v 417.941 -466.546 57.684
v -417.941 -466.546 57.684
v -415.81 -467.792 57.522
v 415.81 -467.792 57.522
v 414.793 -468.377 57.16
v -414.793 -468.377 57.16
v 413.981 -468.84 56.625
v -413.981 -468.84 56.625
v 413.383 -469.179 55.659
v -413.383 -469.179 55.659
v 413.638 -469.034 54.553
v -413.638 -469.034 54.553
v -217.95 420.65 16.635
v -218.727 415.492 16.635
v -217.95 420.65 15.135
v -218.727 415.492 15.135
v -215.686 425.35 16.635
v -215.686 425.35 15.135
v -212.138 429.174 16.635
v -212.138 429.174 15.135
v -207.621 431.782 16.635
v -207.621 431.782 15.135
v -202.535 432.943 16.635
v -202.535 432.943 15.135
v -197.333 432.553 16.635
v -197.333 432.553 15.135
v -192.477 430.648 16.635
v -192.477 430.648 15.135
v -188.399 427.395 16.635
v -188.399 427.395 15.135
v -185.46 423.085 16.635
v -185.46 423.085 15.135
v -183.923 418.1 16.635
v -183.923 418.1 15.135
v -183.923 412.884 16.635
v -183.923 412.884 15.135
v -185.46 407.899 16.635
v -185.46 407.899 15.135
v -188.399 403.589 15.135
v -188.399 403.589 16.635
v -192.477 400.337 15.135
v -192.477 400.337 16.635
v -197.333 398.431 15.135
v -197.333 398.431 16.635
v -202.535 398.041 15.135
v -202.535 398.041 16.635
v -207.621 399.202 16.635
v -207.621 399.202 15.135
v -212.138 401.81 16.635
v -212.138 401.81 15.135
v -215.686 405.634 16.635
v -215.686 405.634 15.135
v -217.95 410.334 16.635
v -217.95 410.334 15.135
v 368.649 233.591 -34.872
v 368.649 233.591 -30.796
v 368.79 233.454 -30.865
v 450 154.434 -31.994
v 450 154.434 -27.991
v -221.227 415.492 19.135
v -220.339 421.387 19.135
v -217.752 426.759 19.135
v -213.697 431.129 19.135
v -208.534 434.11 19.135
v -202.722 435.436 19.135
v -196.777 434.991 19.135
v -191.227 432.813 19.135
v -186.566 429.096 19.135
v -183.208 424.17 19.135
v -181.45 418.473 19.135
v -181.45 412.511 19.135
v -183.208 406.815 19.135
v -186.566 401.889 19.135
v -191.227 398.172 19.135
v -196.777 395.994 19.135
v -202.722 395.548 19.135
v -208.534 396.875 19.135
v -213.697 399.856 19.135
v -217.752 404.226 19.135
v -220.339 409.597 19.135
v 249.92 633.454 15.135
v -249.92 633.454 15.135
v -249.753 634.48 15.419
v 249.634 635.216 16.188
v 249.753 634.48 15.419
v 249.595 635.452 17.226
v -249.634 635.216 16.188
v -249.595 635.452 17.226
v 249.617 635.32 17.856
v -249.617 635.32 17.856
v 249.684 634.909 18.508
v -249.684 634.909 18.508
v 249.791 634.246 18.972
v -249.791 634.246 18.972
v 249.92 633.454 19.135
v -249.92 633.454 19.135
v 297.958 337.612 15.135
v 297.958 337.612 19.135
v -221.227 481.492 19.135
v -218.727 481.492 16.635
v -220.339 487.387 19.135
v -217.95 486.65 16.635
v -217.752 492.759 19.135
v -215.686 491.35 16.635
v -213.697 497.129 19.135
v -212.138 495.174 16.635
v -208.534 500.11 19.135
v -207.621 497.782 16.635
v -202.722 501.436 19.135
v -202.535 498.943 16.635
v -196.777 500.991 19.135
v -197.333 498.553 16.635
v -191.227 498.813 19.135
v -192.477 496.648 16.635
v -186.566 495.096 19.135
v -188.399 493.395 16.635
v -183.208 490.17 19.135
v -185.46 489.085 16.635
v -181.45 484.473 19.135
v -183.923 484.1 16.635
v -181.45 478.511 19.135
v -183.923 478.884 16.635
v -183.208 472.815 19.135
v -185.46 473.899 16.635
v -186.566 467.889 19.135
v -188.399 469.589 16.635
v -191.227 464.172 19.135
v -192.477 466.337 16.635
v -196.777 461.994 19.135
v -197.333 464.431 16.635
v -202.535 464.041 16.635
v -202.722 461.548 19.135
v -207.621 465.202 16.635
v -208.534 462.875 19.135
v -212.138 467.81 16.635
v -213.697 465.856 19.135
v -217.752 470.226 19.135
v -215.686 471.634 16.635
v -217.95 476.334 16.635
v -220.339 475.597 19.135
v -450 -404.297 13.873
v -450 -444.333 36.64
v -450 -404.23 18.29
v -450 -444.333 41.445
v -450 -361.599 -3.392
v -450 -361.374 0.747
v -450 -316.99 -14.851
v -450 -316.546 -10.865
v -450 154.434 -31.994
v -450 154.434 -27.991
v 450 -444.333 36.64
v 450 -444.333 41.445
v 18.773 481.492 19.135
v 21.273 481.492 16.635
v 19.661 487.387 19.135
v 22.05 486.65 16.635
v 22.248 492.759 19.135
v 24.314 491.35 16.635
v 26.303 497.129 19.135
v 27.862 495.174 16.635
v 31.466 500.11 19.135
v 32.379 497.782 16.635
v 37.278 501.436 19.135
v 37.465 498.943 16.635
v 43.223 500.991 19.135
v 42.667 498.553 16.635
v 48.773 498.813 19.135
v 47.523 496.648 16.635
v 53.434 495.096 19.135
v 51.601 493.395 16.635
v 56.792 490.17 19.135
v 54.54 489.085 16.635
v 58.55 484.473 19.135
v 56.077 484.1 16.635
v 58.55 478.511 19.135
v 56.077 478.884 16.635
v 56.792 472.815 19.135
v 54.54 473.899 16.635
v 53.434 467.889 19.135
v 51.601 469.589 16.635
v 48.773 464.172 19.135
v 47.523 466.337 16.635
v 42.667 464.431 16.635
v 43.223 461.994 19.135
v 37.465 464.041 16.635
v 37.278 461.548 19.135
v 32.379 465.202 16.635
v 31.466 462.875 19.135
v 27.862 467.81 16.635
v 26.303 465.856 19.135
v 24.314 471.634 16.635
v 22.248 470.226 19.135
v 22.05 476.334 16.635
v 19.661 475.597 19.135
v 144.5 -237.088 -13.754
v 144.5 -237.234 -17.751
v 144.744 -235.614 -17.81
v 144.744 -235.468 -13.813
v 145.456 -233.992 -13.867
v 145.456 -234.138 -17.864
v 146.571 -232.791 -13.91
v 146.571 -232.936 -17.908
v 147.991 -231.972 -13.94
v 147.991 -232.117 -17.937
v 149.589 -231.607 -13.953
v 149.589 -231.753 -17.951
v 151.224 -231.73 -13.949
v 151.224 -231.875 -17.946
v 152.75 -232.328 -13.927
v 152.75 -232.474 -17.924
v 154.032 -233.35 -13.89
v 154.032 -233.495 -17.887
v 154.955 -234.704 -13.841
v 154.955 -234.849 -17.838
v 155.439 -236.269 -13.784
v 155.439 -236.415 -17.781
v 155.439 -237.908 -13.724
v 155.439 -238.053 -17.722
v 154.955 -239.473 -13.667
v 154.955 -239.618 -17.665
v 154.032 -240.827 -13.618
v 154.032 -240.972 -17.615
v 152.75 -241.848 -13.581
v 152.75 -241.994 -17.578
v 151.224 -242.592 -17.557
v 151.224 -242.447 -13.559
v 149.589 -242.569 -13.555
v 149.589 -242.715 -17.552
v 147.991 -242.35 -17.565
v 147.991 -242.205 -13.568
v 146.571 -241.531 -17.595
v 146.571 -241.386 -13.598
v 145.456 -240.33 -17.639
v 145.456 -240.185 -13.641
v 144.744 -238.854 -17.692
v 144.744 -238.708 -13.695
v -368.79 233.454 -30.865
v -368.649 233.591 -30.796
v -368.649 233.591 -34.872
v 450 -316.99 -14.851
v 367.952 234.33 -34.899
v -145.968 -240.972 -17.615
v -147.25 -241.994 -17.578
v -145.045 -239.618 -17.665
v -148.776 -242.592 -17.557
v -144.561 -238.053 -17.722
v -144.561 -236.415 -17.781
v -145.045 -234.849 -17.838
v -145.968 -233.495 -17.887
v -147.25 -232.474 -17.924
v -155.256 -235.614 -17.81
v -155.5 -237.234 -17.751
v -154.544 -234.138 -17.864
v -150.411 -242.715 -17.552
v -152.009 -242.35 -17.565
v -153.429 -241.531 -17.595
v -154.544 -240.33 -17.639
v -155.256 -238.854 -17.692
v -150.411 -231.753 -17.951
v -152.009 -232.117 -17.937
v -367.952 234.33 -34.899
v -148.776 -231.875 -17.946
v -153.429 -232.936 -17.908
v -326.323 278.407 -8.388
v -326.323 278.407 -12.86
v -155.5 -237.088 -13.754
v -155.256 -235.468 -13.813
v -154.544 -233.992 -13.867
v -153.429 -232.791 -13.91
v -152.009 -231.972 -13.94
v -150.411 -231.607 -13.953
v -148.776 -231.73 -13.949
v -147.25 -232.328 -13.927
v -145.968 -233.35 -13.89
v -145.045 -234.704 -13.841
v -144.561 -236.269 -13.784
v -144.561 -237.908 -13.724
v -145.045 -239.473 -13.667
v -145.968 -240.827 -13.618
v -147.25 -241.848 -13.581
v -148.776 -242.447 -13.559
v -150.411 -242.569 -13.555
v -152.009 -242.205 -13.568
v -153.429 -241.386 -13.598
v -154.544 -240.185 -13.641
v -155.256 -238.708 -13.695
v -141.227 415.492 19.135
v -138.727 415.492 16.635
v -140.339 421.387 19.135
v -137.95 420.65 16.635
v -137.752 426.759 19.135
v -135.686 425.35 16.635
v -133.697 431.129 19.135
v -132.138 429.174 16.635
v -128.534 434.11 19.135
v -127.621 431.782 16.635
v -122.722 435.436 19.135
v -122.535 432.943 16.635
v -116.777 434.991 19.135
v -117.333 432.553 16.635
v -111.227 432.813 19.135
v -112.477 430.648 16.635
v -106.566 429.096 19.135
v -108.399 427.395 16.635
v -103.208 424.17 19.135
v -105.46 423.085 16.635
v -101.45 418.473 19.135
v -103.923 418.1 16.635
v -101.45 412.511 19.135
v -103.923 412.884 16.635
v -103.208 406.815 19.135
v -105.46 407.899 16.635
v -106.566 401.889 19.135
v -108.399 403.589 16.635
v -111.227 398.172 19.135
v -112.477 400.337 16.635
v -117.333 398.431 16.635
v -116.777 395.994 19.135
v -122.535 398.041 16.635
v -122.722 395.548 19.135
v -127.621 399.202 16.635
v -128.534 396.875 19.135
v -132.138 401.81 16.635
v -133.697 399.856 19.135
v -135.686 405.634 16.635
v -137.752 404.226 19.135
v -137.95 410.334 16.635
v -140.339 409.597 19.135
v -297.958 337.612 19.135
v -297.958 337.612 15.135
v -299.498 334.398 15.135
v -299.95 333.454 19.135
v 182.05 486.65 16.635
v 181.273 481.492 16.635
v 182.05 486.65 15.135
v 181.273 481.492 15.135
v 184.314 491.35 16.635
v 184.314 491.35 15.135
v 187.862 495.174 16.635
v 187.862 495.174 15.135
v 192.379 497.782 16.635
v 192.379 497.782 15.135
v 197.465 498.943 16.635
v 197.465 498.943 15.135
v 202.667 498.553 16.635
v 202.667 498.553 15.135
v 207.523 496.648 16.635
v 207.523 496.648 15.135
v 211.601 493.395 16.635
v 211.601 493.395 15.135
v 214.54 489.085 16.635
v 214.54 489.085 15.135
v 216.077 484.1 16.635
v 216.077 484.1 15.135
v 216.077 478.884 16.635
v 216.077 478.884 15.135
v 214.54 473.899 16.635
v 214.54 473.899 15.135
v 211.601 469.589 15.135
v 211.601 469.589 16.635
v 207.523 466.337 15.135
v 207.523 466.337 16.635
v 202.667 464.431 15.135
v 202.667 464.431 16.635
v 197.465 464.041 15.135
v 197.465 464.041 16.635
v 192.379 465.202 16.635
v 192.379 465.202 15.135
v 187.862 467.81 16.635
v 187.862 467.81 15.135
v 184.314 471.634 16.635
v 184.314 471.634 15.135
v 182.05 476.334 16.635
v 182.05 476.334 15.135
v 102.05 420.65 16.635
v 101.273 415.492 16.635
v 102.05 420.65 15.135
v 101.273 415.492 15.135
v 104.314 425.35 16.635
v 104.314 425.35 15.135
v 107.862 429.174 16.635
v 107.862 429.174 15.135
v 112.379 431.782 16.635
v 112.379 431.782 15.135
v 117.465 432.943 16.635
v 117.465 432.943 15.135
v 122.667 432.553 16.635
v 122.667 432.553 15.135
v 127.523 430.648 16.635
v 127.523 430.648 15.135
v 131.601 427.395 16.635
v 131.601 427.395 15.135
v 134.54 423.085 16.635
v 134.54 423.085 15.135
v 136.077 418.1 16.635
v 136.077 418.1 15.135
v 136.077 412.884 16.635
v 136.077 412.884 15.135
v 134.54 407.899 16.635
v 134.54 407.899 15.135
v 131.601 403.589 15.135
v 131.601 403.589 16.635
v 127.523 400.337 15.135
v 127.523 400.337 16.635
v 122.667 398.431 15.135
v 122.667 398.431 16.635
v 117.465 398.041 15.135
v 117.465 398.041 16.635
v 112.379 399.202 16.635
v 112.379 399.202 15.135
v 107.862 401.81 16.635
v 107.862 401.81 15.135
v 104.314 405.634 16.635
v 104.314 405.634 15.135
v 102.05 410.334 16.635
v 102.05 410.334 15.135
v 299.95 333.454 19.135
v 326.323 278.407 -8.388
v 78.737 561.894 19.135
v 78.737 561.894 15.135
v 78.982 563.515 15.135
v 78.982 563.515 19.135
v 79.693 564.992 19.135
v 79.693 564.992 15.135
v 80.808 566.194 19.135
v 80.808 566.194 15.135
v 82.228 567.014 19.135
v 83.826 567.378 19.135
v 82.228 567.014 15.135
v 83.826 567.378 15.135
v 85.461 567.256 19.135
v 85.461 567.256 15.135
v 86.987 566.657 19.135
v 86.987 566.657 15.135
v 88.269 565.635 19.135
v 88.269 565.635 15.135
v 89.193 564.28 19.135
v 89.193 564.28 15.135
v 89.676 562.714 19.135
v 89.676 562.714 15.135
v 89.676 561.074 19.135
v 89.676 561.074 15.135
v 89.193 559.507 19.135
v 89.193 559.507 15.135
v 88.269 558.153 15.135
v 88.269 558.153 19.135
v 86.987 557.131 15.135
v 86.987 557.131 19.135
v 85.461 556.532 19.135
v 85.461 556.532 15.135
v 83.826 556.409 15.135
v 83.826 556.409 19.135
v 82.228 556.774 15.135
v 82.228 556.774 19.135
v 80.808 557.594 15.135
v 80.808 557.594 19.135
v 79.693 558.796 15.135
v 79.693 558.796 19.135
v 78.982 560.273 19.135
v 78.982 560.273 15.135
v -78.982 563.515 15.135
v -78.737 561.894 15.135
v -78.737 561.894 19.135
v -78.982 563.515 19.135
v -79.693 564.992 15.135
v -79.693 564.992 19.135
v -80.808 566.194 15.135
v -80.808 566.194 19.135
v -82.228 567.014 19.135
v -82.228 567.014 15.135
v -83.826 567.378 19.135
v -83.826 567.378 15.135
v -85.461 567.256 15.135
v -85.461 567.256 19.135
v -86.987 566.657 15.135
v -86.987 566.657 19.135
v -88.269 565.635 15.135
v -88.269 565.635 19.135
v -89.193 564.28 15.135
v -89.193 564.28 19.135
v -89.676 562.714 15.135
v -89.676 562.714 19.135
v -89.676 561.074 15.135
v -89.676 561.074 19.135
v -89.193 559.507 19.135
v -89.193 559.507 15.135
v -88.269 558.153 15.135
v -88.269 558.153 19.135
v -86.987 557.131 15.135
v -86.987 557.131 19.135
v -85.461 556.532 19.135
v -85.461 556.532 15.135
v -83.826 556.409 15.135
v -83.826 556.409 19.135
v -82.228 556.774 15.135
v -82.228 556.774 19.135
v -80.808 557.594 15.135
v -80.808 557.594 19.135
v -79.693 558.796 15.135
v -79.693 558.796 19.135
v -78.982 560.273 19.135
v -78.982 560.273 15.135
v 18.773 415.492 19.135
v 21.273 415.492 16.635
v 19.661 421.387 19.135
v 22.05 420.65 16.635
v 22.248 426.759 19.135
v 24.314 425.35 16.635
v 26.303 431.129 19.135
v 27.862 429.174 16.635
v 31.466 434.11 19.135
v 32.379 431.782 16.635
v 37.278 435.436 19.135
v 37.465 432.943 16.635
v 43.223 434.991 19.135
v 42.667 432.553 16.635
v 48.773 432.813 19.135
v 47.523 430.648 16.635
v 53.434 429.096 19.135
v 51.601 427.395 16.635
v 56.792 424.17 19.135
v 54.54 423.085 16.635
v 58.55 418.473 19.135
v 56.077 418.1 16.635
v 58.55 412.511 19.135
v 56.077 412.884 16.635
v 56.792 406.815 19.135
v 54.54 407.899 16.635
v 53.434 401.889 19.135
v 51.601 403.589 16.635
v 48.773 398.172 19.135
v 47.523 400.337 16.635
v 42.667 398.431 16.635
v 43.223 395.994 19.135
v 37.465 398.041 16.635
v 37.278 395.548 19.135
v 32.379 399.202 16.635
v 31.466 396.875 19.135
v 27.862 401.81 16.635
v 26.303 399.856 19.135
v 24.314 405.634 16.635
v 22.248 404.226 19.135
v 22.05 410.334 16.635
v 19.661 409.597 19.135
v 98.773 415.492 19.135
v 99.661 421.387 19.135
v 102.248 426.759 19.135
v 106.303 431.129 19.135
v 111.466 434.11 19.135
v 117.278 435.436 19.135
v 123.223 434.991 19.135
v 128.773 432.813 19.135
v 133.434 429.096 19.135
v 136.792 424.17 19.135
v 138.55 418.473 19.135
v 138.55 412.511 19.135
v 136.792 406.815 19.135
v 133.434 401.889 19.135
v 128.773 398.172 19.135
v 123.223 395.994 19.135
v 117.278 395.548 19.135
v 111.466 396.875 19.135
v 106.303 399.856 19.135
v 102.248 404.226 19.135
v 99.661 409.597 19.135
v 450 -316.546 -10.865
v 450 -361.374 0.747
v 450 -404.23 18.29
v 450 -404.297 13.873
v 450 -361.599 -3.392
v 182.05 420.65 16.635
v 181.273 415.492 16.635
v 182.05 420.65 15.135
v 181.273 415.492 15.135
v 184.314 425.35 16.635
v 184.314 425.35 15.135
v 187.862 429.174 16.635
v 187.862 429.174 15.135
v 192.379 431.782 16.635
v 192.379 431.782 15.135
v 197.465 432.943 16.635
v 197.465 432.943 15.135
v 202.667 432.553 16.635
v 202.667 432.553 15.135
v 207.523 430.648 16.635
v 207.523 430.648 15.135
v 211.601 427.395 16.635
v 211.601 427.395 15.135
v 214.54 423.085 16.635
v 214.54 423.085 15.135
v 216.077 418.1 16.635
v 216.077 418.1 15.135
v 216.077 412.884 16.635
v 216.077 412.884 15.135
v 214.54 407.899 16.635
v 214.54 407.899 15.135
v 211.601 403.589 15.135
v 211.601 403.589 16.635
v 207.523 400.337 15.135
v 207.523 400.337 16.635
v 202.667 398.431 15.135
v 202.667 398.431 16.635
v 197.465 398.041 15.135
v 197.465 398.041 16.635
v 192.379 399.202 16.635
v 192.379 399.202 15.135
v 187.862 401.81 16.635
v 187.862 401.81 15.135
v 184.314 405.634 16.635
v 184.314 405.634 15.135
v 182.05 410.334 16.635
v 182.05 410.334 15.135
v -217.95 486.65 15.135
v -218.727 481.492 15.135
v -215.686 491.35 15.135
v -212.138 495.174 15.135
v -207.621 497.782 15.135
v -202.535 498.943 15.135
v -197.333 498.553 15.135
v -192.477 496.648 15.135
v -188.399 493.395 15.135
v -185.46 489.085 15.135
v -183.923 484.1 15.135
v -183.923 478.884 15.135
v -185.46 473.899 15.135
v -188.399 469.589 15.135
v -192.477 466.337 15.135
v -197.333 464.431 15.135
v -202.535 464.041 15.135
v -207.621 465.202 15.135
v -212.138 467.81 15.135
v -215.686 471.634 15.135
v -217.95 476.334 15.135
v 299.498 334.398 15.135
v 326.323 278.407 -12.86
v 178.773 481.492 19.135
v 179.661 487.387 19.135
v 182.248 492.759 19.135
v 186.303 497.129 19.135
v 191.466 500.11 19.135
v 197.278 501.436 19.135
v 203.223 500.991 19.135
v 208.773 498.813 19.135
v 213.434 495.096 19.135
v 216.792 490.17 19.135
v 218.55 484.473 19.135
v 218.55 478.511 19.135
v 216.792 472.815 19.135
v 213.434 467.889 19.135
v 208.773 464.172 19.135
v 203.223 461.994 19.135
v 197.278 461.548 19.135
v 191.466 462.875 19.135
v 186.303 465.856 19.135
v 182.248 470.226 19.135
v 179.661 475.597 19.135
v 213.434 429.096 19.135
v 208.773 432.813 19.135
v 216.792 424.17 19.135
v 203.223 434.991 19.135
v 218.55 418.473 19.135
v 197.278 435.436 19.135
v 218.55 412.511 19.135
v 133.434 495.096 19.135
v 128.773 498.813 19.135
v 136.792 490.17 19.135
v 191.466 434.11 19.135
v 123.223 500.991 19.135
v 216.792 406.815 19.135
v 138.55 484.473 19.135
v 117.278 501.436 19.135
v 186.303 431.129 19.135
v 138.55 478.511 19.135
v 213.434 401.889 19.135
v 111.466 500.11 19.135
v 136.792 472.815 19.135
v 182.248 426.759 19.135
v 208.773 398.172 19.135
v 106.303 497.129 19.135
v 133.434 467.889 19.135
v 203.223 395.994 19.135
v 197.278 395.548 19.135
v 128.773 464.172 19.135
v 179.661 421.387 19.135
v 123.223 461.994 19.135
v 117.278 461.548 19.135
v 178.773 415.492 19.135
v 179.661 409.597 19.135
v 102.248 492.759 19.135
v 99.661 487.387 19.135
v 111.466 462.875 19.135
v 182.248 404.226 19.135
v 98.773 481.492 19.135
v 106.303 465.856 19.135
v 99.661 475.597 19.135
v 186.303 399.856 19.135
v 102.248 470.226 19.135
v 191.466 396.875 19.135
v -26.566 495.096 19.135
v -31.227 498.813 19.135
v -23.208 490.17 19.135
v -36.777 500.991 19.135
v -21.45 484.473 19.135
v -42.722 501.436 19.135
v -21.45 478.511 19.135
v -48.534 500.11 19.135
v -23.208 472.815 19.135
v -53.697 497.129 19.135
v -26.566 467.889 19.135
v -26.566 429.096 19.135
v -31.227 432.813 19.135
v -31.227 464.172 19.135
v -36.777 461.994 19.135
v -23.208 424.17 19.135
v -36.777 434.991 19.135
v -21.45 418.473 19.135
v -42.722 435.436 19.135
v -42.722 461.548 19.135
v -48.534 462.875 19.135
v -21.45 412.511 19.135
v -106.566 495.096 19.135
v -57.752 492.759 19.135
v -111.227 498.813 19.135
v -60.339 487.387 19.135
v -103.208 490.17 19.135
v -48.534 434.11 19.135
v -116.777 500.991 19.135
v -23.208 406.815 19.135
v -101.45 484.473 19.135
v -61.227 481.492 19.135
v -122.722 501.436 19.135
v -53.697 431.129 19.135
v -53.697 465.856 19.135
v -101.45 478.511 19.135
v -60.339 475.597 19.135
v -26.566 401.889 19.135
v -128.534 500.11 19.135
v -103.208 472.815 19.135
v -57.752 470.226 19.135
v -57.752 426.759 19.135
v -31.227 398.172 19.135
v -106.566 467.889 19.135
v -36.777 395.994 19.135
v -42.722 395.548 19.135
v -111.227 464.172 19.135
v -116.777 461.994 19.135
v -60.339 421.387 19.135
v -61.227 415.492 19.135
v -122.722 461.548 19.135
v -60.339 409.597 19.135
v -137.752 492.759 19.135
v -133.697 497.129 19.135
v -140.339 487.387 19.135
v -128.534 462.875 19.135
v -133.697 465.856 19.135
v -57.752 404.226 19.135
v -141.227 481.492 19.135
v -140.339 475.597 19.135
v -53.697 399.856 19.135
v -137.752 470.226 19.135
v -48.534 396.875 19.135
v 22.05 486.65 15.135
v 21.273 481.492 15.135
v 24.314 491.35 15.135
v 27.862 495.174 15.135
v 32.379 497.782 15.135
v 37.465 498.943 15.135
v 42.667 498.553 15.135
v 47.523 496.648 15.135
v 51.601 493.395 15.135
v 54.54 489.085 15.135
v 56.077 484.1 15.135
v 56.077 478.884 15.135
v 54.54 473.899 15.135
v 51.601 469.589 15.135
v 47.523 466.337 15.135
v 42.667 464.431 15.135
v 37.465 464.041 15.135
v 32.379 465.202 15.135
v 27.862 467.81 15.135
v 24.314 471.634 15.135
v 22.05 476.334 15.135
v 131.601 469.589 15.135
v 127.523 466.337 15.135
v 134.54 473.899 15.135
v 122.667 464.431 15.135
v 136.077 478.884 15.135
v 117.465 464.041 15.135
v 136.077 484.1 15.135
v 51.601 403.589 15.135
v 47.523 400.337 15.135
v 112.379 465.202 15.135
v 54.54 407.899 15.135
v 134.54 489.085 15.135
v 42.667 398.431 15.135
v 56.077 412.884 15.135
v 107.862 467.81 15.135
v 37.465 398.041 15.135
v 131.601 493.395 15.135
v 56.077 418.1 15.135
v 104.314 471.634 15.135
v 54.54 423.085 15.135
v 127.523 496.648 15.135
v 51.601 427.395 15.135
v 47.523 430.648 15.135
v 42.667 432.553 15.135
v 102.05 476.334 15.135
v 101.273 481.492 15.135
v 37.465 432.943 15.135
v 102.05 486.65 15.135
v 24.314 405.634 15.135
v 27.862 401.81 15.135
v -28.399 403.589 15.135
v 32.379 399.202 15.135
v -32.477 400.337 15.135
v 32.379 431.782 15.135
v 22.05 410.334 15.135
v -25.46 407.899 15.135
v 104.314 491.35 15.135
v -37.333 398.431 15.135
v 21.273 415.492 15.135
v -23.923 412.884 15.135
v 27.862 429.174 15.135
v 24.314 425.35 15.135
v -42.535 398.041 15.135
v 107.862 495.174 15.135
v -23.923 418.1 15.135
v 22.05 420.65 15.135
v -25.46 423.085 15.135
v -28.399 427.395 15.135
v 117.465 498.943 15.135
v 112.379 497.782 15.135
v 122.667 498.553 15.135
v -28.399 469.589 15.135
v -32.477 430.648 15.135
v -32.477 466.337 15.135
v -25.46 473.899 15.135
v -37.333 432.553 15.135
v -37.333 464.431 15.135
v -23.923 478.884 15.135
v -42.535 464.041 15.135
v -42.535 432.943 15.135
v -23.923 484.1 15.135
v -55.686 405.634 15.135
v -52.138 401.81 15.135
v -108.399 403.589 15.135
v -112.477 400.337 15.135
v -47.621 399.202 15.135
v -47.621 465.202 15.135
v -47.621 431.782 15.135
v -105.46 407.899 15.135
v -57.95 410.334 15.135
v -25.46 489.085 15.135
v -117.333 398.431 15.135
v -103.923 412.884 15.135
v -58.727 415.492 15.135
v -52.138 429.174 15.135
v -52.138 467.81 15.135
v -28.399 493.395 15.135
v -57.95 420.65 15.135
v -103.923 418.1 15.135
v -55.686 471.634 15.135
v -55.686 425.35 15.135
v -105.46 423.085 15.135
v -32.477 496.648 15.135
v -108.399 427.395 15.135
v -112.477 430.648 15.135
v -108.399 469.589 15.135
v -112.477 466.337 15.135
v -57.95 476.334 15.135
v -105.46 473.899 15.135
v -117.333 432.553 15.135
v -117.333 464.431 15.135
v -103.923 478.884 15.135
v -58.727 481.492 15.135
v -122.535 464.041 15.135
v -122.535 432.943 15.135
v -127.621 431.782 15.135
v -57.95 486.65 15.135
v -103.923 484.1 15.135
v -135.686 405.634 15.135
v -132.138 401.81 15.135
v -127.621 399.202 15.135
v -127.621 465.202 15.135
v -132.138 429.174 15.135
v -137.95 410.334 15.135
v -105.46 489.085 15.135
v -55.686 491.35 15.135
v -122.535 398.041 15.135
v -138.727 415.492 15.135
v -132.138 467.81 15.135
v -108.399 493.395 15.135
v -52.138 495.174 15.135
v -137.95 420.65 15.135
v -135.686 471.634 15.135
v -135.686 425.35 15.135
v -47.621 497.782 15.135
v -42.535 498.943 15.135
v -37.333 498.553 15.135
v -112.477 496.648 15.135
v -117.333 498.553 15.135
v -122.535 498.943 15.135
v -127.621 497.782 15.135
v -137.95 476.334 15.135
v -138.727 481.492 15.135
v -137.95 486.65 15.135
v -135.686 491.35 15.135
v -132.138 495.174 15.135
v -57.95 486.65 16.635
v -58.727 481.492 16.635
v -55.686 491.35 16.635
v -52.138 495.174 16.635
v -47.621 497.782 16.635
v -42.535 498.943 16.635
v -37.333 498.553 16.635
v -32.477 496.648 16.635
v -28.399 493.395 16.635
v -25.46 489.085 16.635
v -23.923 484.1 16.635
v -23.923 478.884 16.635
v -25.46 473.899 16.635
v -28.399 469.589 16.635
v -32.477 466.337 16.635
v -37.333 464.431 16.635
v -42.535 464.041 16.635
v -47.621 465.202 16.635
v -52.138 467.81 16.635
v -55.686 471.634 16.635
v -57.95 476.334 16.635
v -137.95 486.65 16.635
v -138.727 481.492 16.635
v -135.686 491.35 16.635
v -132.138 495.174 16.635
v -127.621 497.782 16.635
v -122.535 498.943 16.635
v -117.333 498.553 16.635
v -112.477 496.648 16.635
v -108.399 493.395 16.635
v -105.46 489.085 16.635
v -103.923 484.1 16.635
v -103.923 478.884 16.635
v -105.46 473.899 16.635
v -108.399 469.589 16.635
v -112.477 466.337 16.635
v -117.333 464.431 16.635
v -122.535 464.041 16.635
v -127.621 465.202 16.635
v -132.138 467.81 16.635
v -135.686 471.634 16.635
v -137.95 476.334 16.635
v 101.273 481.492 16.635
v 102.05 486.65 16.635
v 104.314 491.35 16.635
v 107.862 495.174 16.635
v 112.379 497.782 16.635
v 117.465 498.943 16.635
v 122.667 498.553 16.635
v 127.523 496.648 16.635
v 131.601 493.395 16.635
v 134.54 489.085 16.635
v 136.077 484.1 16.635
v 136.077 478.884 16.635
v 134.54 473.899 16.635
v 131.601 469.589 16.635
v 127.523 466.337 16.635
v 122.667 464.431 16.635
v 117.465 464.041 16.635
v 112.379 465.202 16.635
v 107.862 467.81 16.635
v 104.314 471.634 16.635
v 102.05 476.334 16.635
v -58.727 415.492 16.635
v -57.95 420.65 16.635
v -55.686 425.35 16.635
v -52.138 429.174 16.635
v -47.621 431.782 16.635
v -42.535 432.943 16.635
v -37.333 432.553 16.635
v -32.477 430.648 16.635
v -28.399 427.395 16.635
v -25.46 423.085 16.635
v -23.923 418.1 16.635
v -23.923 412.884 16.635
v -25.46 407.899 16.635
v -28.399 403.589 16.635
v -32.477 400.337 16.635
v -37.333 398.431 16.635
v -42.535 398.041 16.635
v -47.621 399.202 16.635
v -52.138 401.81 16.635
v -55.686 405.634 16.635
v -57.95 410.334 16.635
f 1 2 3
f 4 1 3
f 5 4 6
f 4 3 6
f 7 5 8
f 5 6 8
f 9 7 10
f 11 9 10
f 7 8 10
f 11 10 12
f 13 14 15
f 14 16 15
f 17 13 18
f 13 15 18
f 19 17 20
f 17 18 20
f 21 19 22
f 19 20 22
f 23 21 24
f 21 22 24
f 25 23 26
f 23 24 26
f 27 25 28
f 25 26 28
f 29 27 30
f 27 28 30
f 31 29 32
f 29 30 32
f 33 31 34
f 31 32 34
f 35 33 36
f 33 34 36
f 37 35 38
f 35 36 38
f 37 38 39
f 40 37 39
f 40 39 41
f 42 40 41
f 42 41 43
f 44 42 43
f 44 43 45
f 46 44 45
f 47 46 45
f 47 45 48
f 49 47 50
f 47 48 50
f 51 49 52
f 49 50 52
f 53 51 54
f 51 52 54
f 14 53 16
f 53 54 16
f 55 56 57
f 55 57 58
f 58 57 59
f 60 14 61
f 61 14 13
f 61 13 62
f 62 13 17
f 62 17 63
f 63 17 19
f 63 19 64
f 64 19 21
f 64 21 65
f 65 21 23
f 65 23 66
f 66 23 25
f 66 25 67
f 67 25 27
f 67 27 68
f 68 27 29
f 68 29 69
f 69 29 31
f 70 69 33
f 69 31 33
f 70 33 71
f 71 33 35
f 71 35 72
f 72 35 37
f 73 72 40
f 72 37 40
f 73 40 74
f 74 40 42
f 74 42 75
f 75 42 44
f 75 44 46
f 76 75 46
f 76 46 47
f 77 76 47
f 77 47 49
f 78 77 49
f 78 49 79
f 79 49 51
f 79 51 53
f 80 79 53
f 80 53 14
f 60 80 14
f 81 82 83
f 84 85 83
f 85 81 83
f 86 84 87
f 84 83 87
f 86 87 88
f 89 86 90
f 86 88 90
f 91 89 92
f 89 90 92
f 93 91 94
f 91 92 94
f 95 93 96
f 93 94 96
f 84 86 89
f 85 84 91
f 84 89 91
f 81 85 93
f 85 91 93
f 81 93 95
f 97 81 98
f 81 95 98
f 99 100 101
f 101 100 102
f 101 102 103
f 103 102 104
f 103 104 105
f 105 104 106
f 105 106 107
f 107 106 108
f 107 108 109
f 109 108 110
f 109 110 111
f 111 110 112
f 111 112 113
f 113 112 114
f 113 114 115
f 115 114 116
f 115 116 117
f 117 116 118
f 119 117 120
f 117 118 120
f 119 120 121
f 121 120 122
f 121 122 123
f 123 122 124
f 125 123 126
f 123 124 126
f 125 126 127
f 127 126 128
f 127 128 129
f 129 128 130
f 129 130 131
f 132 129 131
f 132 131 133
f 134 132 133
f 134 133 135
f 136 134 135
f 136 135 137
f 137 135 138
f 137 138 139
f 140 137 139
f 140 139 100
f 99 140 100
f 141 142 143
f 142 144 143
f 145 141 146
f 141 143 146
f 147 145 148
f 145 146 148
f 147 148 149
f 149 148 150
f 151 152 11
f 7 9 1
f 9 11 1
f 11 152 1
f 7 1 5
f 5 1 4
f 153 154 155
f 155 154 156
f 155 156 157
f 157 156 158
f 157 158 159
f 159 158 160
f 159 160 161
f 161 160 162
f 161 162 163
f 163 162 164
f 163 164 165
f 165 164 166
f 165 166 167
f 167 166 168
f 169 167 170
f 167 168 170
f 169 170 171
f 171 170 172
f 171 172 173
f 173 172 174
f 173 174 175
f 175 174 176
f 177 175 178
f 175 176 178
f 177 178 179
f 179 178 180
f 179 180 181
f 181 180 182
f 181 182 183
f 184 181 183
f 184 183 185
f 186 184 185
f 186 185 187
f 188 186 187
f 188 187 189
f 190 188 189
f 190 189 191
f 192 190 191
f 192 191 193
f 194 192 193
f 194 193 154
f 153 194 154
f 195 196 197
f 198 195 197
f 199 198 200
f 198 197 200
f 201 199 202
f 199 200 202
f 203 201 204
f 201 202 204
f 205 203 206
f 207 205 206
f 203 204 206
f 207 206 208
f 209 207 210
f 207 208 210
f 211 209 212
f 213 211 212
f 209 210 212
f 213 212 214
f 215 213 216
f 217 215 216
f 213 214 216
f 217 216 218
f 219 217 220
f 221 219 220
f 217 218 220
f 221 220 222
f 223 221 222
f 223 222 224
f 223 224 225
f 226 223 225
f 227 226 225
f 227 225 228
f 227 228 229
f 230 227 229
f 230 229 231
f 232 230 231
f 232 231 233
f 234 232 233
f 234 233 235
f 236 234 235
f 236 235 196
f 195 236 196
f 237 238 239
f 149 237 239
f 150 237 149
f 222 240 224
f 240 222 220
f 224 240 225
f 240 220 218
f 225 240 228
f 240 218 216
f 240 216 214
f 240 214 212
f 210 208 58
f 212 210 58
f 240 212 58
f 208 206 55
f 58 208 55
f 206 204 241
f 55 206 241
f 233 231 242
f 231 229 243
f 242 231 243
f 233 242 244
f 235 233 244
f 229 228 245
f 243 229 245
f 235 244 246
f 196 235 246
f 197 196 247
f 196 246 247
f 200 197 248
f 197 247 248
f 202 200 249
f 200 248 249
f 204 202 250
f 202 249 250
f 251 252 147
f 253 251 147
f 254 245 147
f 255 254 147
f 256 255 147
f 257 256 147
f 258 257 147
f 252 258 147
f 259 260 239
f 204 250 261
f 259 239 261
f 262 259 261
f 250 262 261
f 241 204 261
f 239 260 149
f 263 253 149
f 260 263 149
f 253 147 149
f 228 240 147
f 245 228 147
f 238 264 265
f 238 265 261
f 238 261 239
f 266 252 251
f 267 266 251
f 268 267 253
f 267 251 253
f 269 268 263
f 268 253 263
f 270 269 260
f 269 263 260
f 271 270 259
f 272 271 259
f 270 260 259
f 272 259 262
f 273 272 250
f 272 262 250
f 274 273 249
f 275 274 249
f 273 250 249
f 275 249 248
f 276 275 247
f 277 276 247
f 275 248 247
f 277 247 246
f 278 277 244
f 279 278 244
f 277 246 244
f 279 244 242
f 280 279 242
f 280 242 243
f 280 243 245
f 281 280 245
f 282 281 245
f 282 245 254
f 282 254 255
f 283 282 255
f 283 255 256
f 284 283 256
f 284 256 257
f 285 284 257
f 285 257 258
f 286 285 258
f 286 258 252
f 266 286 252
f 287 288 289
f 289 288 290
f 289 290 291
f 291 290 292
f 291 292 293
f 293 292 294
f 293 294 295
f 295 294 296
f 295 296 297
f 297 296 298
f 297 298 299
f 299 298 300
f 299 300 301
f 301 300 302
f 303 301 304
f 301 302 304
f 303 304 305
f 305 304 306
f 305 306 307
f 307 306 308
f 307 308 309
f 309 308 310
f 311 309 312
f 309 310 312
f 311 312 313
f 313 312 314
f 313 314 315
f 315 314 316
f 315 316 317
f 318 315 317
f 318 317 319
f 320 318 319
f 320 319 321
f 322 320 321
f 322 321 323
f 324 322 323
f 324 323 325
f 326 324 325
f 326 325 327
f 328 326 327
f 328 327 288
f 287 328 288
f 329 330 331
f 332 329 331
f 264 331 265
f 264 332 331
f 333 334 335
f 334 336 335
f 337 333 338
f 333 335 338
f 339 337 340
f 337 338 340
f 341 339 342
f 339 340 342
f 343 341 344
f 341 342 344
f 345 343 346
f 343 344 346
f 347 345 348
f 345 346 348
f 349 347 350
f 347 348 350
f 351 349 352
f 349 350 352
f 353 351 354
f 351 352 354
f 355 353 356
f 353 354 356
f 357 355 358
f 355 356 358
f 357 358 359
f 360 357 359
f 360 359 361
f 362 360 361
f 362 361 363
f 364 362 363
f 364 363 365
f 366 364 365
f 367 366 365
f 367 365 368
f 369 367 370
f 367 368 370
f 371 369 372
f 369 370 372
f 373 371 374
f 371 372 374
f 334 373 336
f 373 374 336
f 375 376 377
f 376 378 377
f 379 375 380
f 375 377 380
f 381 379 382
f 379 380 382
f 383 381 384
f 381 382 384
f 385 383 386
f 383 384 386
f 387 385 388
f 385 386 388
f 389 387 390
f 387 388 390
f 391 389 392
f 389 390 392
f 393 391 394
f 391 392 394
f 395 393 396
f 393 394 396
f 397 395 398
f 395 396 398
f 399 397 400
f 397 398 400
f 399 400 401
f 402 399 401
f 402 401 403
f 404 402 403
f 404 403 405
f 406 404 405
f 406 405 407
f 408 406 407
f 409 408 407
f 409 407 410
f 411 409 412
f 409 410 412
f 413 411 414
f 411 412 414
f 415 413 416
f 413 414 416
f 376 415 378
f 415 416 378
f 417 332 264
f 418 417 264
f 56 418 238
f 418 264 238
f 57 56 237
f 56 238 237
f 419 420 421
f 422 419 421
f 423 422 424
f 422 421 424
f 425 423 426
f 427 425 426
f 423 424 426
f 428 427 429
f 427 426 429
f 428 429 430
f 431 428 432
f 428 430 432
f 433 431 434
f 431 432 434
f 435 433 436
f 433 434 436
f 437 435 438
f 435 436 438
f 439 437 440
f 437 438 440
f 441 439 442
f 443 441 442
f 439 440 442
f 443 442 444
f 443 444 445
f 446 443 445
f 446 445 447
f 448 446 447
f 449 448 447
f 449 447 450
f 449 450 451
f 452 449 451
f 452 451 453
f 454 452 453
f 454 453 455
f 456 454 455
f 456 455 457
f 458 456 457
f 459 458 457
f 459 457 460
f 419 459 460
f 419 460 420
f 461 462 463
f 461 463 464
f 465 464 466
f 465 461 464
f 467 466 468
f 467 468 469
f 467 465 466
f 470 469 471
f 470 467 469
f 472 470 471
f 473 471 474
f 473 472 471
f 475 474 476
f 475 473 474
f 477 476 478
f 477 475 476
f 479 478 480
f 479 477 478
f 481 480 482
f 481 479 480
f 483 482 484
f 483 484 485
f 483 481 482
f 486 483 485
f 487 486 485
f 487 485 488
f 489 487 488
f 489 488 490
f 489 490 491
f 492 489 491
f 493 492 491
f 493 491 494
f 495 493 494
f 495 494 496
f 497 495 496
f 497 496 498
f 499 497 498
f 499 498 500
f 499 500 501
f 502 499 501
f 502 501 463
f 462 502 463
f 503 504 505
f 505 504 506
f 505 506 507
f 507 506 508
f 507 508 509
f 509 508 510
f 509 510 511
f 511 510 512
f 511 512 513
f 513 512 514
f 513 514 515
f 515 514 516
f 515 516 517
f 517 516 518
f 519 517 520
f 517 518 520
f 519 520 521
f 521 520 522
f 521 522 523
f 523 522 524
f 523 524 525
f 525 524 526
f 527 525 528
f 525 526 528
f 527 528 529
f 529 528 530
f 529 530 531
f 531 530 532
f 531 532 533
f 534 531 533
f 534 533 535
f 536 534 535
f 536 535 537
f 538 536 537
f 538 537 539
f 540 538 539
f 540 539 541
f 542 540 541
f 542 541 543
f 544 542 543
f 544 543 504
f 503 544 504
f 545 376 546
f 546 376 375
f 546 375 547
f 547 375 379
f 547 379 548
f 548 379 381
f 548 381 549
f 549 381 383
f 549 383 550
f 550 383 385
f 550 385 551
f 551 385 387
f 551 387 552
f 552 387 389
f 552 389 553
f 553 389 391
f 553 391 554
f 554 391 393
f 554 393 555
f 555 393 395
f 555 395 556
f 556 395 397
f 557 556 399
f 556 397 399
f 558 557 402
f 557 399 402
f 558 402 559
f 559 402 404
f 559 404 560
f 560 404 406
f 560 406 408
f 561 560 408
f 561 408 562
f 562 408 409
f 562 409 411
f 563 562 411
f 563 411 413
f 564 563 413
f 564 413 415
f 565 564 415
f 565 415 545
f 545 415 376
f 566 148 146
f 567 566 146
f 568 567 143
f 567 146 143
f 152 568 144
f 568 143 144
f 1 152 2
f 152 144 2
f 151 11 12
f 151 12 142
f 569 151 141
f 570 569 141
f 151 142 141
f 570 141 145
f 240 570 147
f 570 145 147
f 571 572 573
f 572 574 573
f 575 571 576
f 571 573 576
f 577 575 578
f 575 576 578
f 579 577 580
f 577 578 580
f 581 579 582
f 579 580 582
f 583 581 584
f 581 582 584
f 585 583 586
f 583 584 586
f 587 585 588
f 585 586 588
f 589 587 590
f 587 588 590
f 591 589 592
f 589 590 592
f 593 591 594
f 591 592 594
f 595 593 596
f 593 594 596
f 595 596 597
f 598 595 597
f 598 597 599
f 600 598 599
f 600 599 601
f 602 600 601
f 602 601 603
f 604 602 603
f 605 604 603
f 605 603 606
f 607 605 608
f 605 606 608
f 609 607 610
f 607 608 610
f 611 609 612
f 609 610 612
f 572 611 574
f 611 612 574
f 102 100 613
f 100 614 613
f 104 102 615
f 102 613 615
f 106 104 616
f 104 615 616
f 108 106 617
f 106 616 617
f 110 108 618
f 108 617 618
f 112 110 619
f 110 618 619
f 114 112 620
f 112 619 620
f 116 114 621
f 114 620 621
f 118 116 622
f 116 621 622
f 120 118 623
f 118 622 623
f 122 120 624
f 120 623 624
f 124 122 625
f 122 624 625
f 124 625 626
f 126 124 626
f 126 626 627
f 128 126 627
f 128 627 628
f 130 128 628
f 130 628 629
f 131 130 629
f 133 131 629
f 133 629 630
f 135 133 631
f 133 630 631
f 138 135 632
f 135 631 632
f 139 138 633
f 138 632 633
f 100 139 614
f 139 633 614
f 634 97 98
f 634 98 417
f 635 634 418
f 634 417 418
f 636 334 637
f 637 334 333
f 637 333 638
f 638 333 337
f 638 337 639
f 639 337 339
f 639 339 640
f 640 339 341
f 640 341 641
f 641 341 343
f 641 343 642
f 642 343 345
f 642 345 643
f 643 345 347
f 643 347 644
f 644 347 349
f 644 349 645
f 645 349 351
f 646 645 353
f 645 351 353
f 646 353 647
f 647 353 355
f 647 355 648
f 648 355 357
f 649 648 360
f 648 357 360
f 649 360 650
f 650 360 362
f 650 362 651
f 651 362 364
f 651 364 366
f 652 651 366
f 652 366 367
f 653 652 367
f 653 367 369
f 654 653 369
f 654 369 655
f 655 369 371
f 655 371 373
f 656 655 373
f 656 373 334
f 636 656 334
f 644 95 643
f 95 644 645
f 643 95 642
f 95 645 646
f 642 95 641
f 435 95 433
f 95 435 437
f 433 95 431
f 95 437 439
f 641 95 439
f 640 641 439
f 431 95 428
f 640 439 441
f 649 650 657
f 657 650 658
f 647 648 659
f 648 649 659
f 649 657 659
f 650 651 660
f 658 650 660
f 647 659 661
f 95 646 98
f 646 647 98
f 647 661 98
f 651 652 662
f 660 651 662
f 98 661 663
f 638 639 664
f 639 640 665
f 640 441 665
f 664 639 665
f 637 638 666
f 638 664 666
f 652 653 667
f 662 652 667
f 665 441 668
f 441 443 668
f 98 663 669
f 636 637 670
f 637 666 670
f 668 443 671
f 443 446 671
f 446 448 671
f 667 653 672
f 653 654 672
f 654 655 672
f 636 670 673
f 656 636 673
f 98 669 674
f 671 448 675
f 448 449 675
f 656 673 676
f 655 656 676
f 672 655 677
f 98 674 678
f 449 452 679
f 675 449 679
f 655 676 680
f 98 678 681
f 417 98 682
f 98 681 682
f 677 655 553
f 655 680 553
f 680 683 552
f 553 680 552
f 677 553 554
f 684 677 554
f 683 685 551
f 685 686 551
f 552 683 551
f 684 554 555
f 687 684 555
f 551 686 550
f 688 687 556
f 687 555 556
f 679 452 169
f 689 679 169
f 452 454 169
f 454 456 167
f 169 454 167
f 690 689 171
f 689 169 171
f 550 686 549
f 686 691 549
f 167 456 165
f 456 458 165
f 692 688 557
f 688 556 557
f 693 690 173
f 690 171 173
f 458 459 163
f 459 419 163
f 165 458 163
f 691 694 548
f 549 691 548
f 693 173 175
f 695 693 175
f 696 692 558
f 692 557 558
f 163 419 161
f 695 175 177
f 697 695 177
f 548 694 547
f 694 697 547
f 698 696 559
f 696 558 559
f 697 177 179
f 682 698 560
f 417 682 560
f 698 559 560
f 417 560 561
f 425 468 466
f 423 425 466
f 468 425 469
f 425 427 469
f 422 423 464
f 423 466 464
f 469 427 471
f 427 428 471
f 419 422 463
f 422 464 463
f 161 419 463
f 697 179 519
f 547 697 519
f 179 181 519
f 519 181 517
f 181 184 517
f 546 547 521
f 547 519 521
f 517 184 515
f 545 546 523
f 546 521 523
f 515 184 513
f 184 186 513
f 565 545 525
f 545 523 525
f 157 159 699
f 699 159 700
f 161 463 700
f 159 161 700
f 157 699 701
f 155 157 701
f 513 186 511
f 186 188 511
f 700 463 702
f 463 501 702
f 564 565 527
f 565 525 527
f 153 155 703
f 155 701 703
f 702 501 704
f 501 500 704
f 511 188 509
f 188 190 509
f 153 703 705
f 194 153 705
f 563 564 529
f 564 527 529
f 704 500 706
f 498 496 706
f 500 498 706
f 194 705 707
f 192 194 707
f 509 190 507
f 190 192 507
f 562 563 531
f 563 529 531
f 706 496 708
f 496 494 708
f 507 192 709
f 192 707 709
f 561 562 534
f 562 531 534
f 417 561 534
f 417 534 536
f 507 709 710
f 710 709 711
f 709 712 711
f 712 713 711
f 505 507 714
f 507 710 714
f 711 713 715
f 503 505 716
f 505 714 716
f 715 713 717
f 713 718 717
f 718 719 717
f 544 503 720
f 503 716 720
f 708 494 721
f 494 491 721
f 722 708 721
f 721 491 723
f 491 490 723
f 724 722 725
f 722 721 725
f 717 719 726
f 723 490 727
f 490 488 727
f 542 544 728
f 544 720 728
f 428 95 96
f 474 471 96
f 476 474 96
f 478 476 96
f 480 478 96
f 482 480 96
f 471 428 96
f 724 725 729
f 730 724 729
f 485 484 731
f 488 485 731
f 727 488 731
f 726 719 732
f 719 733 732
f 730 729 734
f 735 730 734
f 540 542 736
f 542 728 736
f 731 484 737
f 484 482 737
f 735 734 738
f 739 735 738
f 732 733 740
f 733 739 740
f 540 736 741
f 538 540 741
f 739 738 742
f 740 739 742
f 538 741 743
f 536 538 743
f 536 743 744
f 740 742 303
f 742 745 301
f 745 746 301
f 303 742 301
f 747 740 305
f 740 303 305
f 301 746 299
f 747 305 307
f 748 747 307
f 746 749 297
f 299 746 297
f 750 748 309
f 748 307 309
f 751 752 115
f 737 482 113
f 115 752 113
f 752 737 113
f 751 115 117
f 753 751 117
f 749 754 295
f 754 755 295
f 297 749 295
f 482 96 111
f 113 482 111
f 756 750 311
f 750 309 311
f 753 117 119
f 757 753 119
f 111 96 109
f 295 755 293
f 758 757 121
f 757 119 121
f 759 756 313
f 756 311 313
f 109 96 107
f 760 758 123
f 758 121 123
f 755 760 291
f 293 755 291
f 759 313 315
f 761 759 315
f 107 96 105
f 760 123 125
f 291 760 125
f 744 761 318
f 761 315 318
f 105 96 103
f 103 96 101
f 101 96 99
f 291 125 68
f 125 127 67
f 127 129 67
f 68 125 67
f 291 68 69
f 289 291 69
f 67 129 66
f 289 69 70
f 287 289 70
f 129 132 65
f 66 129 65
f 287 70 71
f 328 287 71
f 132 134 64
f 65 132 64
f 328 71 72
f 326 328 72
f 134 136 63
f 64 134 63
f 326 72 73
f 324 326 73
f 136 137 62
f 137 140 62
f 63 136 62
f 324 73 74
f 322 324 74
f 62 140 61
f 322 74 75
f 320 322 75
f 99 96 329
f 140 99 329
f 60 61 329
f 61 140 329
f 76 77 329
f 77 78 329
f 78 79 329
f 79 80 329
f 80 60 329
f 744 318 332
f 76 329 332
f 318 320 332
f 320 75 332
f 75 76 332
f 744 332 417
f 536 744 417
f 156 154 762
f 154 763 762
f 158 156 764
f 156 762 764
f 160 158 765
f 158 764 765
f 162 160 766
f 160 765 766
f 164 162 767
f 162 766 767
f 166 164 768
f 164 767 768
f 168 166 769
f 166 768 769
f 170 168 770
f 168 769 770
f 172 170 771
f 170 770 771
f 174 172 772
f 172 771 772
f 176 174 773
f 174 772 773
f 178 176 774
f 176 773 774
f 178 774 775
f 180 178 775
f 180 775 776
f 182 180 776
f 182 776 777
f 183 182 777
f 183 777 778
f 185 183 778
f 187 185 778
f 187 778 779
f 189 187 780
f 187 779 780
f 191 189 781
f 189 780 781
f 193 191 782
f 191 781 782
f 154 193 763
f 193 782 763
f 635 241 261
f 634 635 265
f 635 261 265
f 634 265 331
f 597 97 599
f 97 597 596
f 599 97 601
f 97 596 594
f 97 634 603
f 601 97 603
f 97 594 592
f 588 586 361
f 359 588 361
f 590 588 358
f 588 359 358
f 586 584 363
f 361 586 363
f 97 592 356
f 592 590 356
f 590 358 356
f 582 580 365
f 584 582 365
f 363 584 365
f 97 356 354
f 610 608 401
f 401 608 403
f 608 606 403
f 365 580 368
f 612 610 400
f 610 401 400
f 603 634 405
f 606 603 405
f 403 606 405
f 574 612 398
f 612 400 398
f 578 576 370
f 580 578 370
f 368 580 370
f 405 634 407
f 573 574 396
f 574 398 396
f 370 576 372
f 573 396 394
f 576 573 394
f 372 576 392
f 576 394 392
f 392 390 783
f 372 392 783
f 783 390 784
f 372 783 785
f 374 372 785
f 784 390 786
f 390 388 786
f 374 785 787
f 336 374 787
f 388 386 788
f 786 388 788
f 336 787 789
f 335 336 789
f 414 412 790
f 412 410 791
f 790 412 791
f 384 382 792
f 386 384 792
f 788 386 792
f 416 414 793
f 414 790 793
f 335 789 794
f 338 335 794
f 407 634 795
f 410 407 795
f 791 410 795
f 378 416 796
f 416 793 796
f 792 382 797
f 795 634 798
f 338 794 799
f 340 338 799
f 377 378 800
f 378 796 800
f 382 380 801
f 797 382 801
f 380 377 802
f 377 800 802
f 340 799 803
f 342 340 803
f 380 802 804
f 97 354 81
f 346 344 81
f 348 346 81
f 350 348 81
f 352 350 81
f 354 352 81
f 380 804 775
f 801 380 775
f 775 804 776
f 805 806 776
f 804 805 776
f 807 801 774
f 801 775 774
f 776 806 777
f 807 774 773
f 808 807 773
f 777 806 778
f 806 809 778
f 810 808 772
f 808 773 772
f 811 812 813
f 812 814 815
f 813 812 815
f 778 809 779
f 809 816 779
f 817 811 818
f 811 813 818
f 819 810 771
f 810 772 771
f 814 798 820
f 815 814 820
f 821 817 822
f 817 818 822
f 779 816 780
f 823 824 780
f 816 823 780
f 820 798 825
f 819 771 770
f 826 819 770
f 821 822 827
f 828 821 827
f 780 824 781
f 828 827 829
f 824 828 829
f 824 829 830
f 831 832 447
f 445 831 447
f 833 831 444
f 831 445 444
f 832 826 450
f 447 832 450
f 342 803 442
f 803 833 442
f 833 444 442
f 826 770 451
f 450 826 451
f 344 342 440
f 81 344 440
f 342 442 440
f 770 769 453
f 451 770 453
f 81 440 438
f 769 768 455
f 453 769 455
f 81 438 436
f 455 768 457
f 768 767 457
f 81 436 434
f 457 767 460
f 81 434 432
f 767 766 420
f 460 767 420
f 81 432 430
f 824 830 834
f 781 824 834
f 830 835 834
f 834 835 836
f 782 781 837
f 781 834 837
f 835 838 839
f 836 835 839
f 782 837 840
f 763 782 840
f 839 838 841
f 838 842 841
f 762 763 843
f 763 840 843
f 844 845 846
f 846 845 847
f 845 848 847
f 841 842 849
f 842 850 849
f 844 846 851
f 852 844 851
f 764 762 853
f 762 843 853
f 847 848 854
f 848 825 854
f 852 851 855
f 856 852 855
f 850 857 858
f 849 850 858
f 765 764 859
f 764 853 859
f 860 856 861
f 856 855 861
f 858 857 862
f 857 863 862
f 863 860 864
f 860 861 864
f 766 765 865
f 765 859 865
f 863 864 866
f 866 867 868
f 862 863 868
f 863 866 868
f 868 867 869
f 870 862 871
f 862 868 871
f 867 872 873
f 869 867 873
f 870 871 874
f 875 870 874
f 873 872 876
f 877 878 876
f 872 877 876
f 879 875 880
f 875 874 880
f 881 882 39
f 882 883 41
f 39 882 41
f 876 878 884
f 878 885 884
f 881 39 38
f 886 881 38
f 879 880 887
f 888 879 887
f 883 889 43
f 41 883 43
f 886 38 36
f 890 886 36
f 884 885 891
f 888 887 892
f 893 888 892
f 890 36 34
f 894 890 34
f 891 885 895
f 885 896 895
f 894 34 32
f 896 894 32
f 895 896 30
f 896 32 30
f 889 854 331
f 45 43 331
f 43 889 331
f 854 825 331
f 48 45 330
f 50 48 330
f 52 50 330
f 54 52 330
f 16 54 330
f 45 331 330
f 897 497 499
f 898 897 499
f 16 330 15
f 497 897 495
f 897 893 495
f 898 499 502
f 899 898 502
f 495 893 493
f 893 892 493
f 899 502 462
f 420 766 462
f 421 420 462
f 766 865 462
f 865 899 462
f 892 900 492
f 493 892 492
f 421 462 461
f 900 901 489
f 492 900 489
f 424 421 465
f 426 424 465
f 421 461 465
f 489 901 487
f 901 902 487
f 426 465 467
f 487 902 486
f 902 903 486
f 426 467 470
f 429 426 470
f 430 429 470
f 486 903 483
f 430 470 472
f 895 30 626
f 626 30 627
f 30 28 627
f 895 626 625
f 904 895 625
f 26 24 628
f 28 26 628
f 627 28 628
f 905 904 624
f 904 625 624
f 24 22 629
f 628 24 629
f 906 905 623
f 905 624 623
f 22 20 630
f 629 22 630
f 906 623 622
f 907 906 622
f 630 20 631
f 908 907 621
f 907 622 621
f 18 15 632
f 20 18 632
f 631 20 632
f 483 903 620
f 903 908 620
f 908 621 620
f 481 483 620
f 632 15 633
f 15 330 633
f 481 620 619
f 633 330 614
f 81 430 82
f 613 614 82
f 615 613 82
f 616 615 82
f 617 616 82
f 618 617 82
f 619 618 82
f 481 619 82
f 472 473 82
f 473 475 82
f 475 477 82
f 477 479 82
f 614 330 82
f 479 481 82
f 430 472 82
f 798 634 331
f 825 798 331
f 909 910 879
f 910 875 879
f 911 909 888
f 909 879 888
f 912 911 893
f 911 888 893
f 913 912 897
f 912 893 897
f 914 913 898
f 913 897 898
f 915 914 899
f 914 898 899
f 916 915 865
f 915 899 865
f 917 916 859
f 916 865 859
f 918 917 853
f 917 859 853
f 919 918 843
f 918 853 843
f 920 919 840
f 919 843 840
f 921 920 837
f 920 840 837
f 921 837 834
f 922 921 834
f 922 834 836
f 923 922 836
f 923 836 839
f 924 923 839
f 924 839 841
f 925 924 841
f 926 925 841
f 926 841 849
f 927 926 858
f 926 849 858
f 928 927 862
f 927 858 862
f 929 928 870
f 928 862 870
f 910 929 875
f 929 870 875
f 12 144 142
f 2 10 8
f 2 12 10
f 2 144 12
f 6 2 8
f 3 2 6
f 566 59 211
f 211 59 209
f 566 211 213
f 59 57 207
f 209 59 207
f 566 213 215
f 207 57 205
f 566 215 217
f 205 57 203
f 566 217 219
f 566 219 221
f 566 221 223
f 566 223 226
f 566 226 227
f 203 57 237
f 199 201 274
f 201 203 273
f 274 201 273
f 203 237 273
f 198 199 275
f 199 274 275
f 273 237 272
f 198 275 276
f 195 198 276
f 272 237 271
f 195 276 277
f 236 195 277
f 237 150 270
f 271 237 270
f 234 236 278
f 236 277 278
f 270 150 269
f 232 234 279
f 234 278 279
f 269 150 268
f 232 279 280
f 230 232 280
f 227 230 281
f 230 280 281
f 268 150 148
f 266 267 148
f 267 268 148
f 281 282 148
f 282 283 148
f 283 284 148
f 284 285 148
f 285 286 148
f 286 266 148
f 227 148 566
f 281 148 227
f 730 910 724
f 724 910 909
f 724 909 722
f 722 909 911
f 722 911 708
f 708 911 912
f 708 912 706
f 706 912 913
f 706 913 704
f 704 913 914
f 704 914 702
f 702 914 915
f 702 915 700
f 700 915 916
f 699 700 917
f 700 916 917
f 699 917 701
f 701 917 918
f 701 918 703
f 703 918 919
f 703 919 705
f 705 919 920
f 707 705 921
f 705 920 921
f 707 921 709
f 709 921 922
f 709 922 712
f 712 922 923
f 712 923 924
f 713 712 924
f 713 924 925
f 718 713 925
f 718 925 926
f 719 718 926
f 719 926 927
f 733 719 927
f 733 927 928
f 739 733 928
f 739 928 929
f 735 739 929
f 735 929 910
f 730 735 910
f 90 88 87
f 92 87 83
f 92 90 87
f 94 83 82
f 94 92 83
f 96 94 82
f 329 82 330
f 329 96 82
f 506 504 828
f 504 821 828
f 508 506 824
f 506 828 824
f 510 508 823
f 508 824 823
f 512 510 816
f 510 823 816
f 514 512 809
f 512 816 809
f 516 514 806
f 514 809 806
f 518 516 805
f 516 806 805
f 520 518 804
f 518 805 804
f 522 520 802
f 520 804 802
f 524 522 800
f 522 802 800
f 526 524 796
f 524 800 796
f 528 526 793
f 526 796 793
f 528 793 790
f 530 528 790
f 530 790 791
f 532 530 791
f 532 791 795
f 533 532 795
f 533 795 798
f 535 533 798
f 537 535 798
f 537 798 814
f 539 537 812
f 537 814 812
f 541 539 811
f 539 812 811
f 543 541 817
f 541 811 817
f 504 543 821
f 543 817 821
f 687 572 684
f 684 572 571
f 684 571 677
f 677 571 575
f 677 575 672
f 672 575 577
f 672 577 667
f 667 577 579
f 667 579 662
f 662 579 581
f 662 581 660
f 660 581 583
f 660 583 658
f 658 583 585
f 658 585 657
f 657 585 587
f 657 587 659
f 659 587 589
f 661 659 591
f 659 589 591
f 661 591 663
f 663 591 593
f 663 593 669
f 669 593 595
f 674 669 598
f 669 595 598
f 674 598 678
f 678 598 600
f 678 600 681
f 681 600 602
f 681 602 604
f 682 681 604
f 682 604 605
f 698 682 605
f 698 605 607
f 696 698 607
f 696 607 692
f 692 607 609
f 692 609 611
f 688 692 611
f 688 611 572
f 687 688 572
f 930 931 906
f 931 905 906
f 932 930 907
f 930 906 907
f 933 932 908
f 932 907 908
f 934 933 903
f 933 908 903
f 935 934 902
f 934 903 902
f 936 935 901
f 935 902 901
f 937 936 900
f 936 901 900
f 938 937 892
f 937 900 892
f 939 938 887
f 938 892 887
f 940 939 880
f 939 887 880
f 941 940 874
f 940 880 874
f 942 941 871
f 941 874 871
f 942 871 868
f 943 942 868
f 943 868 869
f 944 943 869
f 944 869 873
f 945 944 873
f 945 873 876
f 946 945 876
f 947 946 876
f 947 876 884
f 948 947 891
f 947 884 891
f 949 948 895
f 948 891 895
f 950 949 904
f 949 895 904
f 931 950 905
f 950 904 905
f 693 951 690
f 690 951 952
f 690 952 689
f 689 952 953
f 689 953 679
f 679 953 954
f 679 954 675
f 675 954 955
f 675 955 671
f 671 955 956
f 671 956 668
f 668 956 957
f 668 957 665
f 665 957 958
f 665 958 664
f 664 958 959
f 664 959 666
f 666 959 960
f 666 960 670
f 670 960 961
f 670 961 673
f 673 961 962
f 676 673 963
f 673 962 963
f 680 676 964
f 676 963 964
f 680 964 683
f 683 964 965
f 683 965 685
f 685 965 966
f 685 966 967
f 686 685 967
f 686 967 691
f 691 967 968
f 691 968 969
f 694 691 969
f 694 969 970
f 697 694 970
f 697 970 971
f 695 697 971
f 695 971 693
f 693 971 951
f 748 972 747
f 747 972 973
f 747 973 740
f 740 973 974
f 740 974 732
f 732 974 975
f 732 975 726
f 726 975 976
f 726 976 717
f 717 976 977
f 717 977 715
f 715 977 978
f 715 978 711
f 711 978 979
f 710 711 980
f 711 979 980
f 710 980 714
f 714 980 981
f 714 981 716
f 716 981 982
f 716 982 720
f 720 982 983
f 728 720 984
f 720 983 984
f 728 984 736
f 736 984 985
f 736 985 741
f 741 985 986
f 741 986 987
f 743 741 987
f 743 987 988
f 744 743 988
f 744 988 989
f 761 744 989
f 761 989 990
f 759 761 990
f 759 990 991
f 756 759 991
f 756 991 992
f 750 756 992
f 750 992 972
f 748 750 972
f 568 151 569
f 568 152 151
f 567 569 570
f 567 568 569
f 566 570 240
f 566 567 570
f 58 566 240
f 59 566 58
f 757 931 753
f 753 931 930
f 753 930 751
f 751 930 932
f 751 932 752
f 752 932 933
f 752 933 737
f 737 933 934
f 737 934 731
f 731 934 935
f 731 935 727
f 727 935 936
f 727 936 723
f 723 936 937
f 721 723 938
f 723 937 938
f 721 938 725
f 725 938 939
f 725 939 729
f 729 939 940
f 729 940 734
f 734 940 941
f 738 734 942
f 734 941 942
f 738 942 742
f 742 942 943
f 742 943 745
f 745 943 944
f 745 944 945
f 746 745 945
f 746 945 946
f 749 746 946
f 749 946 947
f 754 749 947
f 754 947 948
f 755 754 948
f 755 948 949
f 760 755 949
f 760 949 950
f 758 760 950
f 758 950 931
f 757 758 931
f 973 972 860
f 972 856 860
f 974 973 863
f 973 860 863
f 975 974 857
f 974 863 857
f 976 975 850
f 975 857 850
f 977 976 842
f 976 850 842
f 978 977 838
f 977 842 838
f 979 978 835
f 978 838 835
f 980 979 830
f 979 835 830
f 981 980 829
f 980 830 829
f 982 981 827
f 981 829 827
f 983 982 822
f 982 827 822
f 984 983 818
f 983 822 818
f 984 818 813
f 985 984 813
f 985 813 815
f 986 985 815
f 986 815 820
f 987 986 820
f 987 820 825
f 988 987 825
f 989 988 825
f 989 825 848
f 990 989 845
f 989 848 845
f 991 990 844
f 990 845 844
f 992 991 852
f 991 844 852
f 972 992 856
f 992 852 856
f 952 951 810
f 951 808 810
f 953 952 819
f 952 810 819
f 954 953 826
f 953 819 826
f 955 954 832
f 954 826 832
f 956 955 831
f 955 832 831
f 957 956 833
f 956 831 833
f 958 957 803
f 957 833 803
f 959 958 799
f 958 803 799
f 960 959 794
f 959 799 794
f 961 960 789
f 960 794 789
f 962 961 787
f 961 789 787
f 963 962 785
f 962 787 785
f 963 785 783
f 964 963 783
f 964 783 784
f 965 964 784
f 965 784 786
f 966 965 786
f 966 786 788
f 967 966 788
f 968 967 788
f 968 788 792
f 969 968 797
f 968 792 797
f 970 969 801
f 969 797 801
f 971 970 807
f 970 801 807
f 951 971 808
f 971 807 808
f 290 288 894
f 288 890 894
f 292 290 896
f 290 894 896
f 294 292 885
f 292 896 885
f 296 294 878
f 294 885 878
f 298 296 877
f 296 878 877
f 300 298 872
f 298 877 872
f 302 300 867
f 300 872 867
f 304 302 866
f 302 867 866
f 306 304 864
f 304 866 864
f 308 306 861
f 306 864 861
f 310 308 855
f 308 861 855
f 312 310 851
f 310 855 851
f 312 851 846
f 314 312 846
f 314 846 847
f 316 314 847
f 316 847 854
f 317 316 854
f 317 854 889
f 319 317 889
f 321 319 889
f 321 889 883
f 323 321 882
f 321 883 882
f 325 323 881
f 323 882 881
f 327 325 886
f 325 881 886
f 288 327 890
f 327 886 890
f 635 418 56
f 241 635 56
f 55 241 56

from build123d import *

# Parameters (mm, degrees)
F2_DEPTH        = 450
F5_DEPTH        = 137
F7_DEPTH        = 134.9001572951
F9_D            = 11
F12_D           = 11
F14_D           = 35
F14_CSINK_D     = 40
F14_CSINK_ANGLE = 90


with BuildPart() as f2:
    # F1 (on offset) → F2 (new body, through all)
    with BuildSketch(Plane.YZ.offset(450)):
        with BuildLine():
            ThreePointArc((633.4541976452, 15.1353164322), (635.4541972499, 17.135316037), (633.4541976452, 19.1353156418))
            Line((633.4541976452, 19.1353156418), (333.4541976452, 19.1353156418))
            Line((333.4541976452, 19.1353156418), (233.4541976452, -30.8646843582))
            Line((233.4541976452, -30.8646843582), (-316.5458023548, -10.8646843582))
            ThreePointArc((-316.5458023548, -10.8646843582), (-395.7263494601, 14.2619563044), (-466.5458023548, 57.6844412928))
            ThreePointArc((-466.5458023548, 57.6844412928), (-468.6915325534, 56.8348647408), (-469.0341345652, 54.5526372621))
            ThreePointArc((-469.0341345652, 54.5526372621), (-397.2522499905, 10.5614235075), (-316.9897726189, -14.8511829484))
            Line((-316.9897726189, -14.8511829484), (234.329521914, -34.8991572951))
            Line((234.329521914, -34.8991572951), (334.3984693686, 15.1353164322))
            Line((334.3984693686, 15.1353164322), (633.4541976452, 15.1353164322))
        make_face()
    extrude(amount=-F2_DEPTH)

    # F4 (on offset) → F5 (cut)
    with BuildSketch(Plane.XY.offset(100)):
        Polygon((498.5155965069, 703.4857805286), (218.7778259494, 735.3884513889), (237.0079512575, 712.9704888378), (297.9584336281, 337.6117348671), (326.3231515884, 278.4070670605), (368.6494827271, 233.5909307003), (451.0919357517, 153.3712233816), (483.6110378483, 153.3712233816), align=None)
    extrude(amount=-F5_DEPTH, mode=Mode.SUBTRACT)

    # F6 (on offset) → F7 (cut, through all)
    with BuildSketch(Plane.XY.offset(100)):
        with BuildLine():
            ThreePointArc((478.8447916508, -417.378693819), (427.8834958855, -460.3781245943), (367.9305016994, -489.5610511303))
            Line((367.9305016994, -489.5610511303), (478.8447916508, -496.6032207012))
            Line((478.8447916508, -496.6032207012), (478.8447916508, -417.378693819))
        make_face()
    extrude(amount=-F7_DEPTH, mode=Mode.SUBTRACT)

    # F9 (through all)
    with Locations(Plane.XY.offset(19.1353156418)):
        with Locations((84.2372775078, 561.8938207626)):
            Hole(F9_D / 2)

    # F10: F2 across plane


with BuildPart() as f2_1:
    add(f2.part)
    add(f2.part.mirror(Plane.YZ))

    # F12 (through all)
    with Locations(Plane(origin=(0, -0.8125779098, -22.3458925199), x_dir=(1, 0, 0), z_dir=(0, 0.0363396181, 0.9993394979))):
        with Locations((-150, -236.43194139), (150, -236.43194139)):
            Hole(F12_D / 2)

    # F14 (through all)
    with Locations(Plane.XY.offset(19.1353156418)):
        with Locations((198.7729519606, 481.4921915531), (118.7729519606, 481.4921915531), (38.7729519606, 481.4921915531), (-41.2270480394, 481.4921915531), (-121.2270480394, 481.4921915531), (-201.2270480394, 481.4921915531), (-201.2270480394, 415.4921915531), (-121.2270480394, 415.4921915531), (-41.2270480394, 415.4921915531), (38.7729519606, 415.4921915531), (118.7729519606, 415.4921915531), (198.7729519606, 415.4921915531)):
            CounterSinkHole(F14_D / 2, F14_CSINK_D / 2, counter_sink_angle=F14_CSINK_ANGLE)


solid = f2_1.part
